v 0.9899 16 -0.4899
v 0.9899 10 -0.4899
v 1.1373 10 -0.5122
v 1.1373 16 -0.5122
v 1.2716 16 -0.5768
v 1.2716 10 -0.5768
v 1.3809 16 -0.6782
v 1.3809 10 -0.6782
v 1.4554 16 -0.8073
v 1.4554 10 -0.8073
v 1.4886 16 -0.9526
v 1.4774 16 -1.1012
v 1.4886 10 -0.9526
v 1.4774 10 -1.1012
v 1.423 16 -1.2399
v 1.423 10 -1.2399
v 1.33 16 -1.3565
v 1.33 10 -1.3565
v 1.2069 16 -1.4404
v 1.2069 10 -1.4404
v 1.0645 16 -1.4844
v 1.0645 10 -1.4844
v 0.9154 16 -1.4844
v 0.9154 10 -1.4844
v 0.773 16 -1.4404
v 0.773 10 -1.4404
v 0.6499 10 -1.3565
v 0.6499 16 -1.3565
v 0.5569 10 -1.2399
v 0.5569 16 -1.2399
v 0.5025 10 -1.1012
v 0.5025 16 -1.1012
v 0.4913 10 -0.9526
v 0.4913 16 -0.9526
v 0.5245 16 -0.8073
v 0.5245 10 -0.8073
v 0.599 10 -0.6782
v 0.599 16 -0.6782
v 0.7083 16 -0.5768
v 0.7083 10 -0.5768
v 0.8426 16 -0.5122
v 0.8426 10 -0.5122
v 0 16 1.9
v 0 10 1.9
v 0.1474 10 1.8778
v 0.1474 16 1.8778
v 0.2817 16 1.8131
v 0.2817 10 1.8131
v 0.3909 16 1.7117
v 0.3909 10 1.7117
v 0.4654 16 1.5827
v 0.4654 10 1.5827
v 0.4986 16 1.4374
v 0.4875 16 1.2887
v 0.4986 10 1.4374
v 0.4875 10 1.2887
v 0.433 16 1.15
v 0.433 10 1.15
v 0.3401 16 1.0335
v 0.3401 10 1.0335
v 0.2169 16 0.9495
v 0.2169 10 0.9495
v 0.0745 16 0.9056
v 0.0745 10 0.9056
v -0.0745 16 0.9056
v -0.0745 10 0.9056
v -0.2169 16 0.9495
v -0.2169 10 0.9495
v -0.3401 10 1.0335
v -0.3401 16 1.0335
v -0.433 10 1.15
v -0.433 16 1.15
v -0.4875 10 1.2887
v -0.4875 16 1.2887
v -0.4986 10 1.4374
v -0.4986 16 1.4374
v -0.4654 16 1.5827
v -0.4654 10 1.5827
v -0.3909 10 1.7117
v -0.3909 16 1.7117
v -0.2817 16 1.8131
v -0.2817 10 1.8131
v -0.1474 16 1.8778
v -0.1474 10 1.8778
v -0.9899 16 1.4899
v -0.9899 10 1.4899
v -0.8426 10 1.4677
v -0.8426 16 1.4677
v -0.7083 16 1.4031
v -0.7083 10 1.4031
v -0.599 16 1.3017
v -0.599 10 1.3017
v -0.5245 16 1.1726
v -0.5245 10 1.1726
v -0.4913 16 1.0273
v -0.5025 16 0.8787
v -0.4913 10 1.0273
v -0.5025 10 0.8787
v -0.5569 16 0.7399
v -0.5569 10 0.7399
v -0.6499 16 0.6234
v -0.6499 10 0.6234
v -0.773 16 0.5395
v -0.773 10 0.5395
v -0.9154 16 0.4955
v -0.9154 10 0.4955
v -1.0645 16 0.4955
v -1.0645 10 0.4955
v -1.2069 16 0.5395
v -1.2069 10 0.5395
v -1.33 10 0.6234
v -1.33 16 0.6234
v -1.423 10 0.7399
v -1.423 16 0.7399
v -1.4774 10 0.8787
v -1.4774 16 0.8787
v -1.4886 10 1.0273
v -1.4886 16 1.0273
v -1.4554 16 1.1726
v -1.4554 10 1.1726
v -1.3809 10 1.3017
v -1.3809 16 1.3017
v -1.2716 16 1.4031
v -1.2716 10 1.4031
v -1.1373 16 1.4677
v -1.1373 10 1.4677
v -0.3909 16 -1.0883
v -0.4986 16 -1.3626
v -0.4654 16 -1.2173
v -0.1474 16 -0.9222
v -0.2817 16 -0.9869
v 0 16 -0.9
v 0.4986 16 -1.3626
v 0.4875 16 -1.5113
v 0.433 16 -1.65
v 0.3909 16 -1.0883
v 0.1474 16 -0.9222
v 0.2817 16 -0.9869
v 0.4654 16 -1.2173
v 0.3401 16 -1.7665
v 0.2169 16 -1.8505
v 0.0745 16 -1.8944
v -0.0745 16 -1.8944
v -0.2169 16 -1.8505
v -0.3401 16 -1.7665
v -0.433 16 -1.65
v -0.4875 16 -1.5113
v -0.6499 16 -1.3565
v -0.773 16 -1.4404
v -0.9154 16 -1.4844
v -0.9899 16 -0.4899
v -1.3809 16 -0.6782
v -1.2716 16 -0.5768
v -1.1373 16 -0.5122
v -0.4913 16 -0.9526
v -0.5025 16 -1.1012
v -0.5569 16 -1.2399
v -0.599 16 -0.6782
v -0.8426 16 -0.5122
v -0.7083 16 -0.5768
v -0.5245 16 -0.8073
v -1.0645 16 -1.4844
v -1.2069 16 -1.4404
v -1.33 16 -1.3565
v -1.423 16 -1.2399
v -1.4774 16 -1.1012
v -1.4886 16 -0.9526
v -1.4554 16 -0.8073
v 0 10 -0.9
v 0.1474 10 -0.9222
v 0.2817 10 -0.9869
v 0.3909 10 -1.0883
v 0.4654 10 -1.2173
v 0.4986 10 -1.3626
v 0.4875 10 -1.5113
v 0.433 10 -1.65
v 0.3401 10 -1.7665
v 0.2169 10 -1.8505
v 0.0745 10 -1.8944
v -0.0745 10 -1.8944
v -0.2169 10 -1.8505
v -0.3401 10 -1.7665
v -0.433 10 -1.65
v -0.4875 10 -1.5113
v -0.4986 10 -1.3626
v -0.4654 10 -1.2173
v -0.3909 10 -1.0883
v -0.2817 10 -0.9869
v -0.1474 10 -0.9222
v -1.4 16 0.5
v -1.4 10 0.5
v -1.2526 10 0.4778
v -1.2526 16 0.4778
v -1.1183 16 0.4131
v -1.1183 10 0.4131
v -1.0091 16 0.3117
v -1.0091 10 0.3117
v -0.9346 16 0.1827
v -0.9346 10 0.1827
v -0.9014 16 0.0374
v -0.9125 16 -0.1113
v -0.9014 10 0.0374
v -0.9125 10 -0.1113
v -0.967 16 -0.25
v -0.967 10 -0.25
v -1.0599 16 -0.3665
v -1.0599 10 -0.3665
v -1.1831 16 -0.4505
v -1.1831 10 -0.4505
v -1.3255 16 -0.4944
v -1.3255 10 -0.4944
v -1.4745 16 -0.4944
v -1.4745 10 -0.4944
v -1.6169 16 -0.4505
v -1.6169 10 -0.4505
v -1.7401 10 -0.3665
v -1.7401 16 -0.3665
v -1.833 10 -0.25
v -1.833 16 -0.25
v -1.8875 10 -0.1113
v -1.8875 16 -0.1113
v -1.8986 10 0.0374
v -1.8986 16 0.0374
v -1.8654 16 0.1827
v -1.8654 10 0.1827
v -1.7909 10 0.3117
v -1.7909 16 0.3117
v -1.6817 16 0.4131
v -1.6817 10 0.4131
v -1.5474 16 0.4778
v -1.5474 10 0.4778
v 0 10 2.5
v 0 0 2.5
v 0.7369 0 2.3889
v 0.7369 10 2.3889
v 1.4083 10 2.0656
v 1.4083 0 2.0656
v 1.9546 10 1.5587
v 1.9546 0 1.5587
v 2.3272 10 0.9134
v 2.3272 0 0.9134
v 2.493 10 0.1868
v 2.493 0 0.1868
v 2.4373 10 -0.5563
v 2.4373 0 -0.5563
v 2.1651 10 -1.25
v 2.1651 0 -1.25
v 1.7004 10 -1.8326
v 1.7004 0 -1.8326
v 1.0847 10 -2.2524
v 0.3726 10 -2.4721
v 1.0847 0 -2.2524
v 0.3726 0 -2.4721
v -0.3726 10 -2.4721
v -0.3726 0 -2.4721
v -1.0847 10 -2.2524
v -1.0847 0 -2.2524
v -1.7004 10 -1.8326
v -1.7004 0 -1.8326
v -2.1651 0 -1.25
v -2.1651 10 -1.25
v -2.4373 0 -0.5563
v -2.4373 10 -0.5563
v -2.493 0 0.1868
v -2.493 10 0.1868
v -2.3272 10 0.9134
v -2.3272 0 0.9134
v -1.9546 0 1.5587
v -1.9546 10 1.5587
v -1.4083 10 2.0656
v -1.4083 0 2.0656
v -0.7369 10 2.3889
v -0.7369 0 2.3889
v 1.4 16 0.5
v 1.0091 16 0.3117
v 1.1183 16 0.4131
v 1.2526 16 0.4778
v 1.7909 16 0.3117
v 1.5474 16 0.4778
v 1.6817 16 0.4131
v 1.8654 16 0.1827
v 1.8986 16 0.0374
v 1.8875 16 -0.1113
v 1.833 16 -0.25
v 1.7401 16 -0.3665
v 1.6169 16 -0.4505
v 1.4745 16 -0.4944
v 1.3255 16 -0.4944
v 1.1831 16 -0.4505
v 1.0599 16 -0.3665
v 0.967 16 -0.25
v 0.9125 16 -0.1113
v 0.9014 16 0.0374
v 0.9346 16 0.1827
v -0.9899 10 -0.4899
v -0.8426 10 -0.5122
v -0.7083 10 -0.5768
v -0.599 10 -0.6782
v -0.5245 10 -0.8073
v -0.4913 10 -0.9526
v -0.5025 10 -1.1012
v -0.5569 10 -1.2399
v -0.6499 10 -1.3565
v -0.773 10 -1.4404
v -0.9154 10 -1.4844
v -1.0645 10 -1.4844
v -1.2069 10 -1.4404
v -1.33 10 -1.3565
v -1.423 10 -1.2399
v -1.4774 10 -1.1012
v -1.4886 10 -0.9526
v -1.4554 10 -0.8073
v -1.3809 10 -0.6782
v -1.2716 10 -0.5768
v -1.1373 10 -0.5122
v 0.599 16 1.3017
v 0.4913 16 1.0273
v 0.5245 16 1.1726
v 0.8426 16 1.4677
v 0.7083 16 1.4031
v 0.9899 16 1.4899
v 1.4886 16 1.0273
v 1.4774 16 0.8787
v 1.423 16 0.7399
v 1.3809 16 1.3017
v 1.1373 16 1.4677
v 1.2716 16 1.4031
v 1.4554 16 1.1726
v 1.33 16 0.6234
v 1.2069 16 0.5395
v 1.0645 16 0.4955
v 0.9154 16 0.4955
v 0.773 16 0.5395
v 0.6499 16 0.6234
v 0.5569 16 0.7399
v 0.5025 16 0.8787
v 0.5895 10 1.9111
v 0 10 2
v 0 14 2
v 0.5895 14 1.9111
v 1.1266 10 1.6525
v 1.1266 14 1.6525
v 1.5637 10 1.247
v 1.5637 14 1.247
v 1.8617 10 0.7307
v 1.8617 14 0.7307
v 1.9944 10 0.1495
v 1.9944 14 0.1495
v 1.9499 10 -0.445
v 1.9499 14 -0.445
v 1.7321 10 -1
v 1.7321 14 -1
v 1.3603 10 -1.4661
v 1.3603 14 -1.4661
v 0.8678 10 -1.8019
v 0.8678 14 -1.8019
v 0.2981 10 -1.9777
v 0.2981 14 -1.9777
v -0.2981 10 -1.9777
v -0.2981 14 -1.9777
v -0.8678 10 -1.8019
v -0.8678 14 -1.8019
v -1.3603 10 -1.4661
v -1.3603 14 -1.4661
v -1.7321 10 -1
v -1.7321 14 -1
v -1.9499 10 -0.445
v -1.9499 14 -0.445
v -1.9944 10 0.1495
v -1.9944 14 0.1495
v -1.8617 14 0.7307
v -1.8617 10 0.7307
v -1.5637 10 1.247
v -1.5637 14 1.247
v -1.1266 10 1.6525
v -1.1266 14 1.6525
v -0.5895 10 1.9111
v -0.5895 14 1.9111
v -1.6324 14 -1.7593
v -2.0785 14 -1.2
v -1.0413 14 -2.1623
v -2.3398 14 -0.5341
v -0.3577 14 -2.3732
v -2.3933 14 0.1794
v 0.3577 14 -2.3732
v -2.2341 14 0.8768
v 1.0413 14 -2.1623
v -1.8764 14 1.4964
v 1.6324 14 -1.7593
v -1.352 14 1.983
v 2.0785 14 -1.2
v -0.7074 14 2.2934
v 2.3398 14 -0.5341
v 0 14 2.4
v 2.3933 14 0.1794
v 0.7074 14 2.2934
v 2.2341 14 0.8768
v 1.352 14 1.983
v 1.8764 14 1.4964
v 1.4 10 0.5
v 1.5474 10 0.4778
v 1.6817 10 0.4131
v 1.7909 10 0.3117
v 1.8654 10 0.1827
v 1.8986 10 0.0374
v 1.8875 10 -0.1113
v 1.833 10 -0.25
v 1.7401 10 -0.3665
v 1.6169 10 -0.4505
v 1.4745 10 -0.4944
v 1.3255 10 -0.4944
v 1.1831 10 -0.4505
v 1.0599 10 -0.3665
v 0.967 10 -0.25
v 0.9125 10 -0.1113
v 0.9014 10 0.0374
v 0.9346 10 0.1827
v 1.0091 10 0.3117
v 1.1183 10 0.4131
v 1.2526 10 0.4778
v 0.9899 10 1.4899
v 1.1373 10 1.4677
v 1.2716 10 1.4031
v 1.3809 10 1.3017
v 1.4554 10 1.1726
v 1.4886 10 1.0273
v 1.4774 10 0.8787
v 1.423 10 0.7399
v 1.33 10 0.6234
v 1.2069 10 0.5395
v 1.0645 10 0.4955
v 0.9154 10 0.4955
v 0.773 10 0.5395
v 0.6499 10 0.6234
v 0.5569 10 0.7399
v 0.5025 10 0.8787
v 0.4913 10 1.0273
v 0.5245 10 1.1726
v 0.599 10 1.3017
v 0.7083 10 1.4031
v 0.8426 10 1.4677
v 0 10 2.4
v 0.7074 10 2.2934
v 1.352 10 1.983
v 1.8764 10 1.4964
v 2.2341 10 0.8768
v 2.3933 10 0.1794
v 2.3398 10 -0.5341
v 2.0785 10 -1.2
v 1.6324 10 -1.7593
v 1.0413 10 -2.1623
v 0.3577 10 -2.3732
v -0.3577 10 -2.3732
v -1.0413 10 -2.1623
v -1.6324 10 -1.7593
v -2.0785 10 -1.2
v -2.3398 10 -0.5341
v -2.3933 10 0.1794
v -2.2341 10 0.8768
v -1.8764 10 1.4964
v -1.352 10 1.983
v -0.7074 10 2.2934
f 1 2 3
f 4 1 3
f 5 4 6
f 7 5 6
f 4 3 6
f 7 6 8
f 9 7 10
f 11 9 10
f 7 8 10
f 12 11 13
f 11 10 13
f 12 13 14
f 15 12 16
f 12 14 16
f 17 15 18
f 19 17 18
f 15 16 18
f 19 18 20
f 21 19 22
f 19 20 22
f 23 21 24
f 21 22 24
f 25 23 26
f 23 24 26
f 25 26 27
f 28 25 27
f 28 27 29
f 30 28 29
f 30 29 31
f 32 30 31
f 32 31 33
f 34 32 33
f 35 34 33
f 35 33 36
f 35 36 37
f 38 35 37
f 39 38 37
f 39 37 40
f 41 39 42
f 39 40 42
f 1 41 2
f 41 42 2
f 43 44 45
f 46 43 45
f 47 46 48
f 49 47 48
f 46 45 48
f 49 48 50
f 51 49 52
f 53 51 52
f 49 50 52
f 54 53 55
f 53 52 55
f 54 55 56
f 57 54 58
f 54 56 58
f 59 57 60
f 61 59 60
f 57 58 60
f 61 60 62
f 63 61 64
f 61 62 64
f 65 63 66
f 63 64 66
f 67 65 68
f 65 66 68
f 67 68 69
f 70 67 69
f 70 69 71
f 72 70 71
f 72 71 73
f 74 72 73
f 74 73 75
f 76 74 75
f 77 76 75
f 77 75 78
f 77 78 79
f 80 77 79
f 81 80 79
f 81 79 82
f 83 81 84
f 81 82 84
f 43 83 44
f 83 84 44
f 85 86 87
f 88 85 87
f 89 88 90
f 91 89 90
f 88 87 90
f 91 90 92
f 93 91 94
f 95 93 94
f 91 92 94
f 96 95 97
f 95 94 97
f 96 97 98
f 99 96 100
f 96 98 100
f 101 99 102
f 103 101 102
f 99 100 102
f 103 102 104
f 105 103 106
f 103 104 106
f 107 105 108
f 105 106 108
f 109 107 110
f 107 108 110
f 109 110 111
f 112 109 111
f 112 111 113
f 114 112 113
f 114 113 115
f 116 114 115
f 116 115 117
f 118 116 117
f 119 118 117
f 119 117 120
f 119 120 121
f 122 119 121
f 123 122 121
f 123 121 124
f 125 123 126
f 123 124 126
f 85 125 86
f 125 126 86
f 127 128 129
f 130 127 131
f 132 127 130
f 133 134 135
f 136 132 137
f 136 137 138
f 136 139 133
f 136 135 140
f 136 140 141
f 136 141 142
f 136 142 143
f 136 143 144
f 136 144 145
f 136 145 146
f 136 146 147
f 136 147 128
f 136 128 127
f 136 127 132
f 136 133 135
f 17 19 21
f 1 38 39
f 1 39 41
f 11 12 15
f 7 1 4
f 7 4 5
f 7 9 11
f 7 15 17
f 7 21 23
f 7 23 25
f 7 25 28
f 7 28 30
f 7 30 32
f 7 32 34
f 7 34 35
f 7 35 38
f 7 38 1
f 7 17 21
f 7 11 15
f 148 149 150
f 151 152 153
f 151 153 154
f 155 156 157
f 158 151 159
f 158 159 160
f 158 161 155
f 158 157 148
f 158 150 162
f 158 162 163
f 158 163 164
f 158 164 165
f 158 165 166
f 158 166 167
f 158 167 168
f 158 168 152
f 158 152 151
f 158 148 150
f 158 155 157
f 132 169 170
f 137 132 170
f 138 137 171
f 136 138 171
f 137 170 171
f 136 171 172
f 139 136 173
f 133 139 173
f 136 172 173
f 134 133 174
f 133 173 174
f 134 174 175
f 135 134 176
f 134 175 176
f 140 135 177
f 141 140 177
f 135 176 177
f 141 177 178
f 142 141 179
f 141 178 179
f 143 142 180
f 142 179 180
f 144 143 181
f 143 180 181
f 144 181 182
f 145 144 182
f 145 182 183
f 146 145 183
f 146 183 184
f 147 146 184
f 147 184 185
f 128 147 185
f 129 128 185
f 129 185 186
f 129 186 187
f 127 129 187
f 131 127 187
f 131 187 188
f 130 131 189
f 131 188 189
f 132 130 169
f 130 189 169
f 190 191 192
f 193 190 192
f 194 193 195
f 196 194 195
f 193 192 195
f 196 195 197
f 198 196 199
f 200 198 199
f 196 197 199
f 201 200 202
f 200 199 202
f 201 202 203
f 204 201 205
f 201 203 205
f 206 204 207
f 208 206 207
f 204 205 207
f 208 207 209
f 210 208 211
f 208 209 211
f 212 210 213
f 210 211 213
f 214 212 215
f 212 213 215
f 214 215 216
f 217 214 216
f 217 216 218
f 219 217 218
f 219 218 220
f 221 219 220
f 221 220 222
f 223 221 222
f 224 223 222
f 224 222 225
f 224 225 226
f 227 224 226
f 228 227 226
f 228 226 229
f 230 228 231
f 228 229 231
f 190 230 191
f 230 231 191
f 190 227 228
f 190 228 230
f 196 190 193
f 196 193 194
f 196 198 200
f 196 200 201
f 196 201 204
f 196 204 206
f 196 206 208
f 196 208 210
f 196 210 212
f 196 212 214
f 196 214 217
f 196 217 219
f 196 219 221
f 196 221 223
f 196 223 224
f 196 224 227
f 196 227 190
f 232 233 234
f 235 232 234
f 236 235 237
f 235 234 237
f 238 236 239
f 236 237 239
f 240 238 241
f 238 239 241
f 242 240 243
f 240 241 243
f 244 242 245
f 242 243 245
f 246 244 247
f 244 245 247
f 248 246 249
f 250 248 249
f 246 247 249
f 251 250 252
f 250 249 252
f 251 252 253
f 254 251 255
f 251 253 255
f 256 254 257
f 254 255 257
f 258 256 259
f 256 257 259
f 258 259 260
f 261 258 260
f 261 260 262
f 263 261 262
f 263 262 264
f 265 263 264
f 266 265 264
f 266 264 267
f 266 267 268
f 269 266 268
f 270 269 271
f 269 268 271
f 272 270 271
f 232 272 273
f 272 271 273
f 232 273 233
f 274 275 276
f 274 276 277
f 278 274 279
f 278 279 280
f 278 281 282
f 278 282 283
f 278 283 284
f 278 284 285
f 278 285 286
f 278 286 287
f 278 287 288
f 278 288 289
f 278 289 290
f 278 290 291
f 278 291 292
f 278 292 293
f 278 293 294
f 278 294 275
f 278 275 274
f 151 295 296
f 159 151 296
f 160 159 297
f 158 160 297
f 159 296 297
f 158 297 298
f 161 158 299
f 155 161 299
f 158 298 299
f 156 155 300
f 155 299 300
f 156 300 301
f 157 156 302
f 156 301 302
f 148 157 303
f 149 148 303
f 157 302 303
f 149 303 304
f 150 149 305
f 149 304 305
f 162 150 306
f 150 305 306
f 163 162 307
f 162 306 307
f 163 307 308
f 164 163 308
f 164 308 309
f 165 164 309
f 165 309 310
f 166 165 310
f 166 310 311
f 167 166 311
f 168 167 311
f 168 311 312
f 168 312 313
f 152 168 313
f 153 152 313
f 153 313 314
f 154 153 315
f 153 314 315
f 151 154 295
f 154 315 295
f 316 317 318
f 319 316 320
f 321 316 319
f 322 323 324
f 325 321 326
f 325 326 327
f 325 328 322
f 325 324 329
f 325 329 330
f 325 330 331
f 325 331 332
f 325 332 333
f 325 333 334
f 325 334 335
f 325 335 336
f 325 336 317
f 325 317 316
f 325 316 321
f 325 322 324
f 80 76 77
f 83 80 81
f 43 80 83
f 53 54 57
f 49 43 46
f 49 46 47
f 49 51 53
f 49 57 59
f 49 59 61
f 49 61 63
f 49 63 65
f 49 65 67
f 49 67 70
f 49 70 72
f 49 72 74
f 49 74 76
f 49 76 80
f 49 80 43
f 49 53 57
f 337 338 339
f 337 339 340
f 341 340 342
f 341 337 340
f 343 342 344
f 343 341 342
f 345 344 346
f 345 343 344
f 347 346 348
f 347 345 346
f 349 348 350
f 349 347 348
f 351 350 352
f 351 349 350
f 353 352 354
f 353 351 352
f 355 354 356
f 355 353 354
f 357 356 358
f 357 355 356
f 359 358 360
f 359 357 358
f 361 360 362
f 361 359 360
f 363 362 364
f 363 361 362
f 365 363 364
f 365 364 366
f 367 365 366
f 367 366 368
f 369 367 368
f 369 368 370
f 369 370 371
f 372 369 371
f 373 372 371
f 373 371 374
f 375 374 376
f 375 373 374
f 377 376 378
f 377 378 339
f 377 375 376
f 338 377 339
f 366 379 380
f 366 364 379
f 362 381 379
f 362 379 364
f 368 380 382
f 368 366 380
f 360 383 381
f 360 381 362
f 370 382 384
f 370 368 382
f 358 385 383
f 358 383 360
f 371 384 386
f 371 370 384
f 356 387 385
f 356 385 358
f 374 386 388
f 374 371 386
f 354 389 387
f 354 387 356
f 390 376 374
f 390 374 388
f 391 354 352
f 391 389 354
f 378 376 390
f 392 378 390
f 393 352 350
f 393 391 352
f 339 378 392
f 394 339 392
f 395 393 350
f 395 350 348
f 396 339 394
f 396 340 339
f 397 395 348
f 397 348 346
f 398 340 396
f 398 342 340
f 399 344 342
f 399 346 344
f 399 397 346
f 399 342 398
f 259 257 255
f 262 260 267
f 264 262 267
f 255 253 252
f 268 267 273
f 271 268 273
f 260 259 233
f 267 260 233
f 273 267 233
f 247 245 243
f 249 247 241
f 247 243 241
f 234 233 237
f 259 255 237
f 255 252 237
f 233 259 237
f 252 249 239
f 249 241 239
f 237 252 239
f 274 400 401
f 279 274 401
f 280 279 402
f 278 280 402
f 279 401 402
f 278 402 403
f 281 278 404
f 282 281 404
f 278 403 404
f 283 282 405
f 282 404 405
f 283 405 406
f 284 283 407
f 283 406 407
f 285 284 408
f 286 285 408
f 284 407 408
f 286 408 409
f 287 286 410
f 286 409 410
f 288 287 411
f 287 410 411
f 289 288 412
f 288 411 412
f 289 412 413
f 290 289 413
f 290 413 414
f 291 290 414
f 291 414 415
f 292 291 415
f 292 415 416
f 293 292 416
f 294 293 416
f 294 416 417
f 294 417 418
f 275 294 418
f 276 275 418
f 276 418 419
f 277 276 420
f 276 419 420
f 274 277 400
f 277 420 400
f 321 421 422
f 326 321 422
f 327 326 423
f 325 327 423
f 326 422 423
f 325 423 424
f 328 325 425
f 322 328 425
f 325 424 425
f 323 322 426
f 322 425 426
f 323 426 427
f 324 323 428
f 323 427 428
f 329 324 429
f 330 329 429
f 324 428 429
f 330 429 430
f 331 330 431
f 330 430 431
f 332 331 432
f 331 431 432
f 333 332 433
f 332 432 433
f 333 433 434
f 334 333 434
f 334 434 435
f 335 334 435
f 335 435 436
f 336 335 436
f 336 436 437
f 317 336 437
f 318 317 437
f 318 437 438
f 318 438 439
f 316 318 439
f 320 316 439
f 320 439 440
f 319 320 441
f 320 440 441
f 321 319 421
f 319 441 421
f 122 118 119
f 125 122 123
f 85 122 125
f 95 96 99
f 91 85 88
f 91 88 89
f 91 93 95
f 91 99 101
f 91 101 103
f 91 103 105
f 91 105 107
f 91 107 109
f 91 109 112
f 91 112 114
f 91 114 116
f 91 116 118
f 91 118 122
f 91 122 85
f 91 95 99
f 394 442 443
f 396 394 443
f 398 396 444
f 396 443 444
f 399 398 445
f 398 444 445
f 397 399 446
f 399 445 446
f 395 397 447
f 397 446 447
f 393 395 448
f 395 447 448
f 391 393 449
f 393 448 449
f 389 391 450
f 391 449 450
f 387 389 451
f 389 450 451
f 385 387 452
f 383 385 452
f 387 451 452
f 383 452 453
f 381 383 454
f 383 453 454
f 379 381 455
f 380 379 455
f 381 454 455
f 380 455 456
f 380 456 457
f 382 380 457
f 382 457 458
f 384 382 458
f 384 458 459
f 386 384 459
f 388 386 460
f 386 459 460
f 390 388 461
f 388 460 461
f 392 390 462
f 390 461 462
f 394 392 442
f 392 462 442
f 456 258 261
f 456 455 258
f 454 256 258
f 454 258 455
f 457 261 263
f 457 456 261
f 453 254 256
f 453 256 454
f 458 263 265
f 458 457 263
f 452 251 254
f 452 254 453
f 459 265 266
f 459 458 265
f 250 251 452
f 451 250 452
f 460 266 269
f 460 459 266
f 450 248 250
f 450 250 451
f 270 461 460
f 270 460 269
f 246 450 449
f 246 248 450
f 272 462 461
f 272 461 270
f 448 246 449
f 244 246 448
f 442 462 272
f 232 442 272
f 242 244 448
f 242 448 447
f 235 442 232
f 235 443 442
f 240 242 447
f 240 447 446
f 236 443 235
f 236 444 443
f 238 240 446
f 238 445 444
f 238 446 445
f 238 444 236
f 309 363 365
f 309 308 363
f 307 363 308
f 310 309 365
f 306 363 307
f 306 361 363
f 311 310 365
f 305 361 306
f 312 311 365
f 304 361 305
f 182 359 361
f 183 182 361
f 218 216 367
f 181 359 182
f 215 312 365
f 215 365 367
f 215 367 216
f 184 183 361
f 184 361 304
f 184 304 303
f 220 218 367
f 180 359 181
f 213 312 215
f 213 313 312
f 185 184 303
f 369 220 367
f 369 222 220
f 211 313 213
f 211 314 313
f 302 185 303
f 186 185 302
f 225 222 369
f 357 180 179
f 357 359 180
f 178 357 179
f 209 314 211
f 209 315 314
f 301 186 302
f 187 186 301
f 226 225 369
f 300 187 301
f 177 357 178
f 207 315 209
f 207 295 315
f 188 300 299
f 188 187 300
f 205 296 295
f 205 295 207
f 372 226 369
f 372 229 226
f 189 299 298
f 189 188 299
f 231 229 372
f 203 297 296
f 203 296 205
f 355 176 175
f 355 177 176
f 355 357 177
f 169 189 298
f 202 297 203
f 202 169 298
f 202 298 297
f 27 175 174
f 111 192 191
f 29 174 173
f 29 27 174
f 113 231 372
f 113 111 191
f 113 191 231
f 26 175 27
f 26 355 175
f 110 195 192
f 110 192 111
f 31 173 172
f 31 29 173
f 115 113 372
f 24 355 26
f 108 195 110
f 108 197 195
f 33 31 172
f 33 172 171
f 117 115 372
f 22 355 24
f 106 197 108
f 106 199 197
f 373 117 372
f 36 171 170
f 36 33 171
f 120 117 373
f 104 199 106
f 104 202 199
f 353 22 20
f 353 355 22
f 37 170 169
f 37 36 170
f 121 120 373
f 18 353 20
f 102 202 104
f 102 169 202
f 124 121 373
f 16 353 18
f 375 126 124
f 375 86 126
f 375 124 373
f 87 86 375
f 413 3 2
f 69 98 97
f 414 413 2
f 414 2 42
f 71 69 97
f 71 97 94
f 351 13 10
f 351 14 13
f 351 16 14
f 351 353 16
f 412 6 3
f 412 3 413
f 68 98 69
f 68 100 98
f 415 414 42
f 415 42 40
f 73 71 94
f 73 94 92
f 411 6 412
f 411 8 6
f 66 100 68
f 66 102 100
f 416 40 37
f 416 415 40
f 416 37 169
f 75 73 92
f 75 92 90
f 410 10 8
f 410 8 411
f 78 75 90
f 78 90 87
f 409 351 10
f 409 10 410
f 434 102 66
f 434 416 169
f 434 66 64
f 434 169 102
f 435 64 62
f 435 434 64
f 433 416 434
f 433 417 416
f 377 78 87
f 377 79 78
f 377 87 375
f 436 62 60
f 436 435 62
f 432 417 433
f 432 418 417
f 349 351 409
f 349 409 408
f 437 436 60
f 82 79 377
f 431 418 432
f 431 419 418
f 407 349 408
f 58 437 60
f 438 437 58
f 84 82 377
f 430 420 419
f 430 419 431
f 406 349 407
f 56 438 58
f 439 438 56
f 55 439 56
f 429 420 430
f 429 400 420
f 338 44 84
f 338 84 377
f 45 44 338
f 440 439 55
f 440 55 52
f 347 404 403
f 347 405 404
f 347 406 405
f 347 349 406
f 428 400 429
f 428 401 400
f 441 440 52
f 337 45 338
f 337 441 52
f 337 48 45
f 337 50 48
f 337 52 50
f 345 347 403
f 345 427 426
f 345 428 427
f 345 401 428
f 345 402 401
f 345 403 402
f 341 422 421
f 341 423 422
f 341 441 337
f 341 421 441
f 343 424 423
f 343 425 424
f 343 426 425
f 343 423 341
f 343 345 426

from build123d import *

# Parameters (mm, degrees)
MAINWIRES_R       = 2.5
MAINWIRE_DEPTH    = 10
VCCS_R            = 0.5
VCC_DEPTH         = 6
GROUNDS_R         = 0.5
GROUND_DEPTH      = 6
AS_2_R            = 0.5
EXTRUDE_A_DEPTH   = 6
BS_R              = 0.5
EXTRUDE_B_DEPTH   = 6
ZS_R              = 0.5
EXTRUDE_Z_DEPTH   = 6
A_S_R             = 0.5
EXTRUDE_A_2_DEPTH = 6
B_S_R             = 0.5
EXTRUDE_B_2_DEPTH = 6
Z_S_R             = 0.5
EXTRUDE_Z_2_DEPTH = 6
SHIELDINGS_R      = 2.4
SHIELDINGS_R_2    = 2
SHIELDING_DEPTH   = 4


with BuildPart() as part:
    # MainWireS → MainWire (new body)
    with BuildSketch(Plane(origin=(0, 0, 0), x_dir=(1, 0, 0), z_dir=(0, 1, 0))):
        with Locations(Location((0, 0, 0), (0, 0, 270))):
            Circle(MAINWIRES_R)
    extrude(amount=MAINWIRE_DEPTH)

    # VccS → Vcc (add)
    with BuildSketch(Plane(origin=(0, 10, 0), x_dir=(1, 0, 0), z_dir=(0, 1, 0))):
        with Locations(Location((0, 1.4, 0), (0, 0, 270))):
            Circle(VCCS_R)
    extrude(amount=VCC_DEPTH)

    # GroundS → Ground (add)
    with BuildSketch(Plane(origin=(0, 10, 0), x_dir=(1, 0, 0), z_dir=(0, 1, 0))):
        with Locations(Location((0.989949494, 0.989949494, 0), (0, 0, 270))):
            Circle(GROUNDS_R)
    extrude(amount=GROUND_DEPTH)

    # AS 2 → Extrude A (add)
    with BuildSketch(Plane(origin=(0, 10, 0), x_dir=(1, 0, 0), z_dir=(0, 1, 0))):
        with Locations(Location((1.4, 0, 0), (0, 0, 270))):
            Circle(AS_2_R)
    extrude(amount=EXTRUDE_A_DEPTH)

    # BS → Extrude B (add)
    with BuildSketch(Plane(origin=(0, 10, 0), x_dir=(1, 0, 0), z_dir=(0, 1, 0))):
        with Locations(Location((0.989949494, -0.989949494, 0), (0, 0, 270))):
            Circle(BS_R)
    extrude(amount=EXTRUDE_B_DEPTH)

    # ZS → Extrude Z (add)
    with BuildSketch(Plane(origin=(0, 10, 0), x_dir=(1, 0, 0), z_dir=(0, 1, 0))):
        with Locations(Location((0, -1.4, 0), (0, 0, 270))):
            Circle(ZS_R)
    extrude(amount=EXTRUDE_Z_DEPTH)

    # A-S → Extrude A 2 (add)
    with BuildSketch(Plane(origin=(0, 10, 0), x_dir=(1, 0, 0), z_dir=(0, 1, 0))):
        with Locations(Location((-0.989949494, -0.989949494, 0), (0, 0, 270))):
            Circle(A_S_R)
    extrude(amount=EXTRUDE_A_2_DEPTH)

    # B-S → Extrude B 2 (add)
    with BuildSketch(Plane(origin=(0, 10, 0), x_dir=(1, 0, 0), z_dir=(0, 1, 0))):
        with Locations(Location((-1.4, 0, 0), (0, 0, 270))):
            Circle(B_S_R)
    extrude(amount=EXTRUDE_B_2_DEPTH)

    # Z-S → Extrude Z 2 (add)
    with BuildSketch(Plane(origin=(0, 10, 0), x_dir=(1, 0, 0), z_dir=(0, 1, 0))):
        with Locations(Location((-0.989949494, 0.989949494, 0), (0, 0, 270))):
            Circle(Z_S_R)
    extrude(amount=EXTRUDE_Z_2_DEPTH)

    # ShieldingS → Shielding (add)
    with BuildSketch(Plane(origin=(0, 10, 0), x_dir=(1, 0, 0), z_dir=(0, 1, 0))):
        with Locations(Location((0, 0, 0), (0, 0, 270))):
            Circle(SHIELDINGS_R)
        with Locations(Location((0, 0, 0), (0, 0, 270))):
            Circle(SHIELDINGS_R_2, mode=Mode.SUBTRACT)
    extrude(amount=SHIELDING_DEPTH)


solid = part.part
